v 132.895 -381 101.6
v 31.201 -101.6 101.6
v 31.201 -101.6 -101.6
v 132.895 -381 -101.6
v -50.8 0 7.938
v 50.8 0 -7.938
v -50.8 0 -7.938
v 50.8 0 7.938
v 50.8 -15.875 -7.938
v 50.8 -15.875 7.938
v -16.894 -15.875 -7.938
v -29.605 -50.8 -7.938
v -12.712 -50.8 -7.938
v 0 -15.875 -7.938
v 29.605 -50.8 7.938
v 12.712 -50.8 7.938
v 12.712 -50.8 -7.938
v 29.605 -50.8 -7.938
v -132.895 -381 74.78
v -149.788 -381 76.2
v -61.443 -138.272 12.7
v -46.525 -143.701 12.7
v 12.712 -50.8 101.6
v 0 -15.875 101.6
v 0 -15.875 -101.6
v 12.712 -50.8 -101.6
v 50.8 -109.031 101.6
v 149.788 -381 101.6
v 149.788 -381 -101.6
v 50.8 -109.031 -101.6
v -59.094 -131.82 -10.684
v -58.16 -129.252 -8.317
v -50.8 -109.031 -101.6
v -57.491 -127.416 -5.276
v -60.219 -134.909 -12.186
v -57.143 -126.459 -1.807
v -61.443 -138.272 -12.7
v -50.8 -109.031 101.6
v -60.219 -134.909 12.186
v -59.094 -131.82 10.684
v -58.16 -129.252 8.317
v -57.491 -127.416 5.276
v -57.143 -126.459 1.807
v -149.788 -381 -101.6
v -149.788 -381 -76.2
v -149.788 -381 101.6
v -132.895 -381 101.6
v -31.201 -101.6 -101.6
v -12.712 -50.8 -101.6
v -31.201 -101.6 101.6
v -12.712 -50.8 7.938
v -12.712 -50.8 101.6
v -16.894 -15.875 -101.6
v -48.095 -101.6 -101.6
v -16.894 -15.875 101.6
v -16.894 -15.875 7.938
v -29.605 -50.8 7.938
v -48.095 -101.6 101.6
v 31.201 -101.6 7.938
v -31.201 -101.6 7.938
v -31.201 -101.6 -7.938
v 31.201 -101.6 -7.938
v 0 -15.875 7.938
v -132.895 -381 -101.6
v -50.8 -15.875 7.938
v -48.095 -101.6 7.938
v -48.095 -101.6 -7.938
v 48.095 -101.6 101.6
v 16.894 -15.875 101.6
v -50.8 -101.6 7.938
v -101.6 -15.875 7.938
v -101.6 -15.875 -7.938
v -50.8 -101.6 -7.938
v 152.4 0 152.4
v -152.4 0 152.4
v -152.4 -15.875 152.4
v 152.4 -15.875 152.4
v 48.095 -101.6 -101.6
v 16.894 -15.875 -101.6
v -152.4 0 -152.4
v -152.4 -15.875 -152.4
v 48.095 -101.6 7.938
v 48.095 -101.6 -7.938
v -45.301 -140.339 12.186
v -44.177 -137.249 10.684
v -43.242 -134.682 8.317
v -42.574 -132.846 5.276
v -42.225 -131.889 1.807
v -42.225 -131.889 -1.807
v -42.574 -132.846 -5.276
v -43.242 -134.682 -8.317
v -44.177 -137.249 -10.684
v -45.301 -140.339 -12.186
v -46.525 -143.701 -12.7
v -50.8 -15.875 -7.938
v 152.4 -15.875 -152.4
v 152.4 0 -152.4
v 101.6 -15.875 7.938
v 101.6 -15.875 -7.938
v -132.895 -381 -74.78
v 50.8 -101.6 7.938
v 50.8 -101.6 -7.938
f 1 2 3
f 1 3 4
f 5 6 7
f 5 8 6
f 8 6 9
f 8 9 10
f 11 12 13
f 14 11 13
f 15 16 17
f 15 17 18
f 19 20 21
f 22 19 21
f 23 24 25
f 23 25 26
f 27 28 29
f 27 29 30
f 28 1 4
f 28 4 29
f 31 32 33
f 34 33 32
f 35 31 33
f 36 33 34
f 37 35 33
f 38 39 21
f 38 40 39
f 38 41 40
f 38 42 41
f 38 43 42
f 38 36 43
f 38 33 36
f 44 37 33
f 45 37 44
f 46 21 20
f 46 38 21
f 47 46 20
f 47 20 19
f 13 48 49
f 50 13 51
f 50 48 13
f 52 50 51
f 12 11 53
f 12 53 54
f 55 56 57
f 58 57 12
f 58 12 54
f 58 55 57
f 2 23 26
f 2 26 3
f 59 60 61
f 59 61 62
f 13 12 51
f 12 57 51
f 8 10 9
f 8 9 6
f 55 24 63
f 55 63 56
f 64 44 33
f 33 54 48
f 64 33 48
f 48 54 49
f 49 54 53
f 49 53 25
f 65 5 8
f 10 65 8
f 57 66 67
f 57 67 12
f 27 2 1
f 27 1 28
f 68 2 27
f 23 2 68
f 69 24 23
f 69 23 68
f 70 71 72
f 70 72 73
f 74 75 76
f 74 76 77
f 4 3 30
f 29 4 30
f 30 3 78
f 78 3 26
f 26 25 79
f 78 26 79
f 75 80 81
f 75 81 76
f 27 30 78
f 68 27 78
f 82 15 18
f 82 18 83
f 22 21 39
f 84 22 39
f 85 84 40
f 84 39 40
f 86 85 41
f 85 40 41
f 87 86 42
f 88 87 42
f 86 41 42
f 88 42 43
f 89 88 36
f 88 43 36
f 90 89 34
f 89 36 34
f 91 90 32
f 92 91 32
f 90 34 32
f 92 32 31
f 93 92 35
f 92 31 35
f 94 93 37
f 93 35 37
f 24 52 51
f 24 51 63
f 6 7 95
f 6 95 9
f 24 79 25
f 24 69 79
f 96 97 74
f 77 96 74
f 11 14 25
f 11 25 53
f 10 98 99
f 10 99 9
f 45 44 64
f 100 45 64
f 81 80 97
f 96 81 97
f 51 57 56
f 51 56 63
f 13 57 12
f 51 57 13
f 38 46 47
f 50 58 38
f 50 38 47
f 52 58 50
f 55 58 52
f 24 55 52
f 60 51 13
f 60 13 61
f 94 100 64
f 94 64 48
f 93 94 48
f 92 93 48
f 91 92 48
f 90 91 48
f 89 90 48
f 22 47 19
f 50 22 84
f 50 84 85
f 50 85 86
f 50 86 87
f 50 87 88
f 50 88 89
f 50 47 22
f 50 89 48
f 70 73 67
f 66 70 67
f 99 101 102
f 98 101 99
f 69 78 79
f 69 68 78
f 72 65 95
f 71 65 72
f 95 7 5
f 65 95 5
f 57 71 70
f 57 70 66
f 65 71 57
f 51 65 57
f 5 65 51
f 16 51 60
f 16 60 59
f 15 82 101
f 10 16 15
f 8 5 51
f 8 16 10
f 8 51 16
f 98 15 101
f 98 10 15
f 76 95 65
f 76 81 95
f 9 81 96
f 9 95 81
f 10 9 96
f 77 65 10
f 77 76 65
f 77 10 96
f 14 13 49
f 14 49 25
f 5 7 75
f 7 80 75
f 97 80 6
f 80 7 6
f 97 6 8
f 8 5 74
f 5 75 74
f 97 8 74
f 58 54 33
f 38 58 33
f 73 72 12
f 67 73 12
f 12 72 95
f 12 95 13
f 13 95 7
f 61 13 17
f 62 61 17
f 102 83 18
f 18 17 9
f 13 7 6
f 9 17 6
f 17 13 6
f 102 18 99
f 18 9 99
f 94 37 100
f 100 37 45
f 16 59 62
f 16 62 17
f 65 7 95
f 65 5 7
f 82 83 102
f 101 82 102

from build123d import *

# Parameters (mm, degrees)
F0_W          = 304.8
F0_H          = 304.8
F0_W_2        = 101.6
F0_H_2        = 15.875
F1_DEPTH      = 15.875
F3_DEPTH      = 7.9375
F3_DEPTH_BACK = 7.9375
F4_DEPTH      = 101.6
F4_DEPTH_BACK = 101.6
F5_DEPTH      = 7.9375
F5_DEPTH_BACK = 7.9375
F7_DEPTH      = 25.4


with BuildPart() as f1:
    # F0 (on Front) → F1 (new body)
    with BuildSketch(Plane.XZ):
        Rectangle(F0_W, F0_H)
        Rectangle(F0_W_2, F0_H_2, mode=Mode.SUBTRACT)
    extrude(amount=F1_DEPTH)


with BuildPart() as f3:
    # F2 (on Top) → F3 (new body, two sides)
    with BuildSketch(Plane.XY) as f3_sk:
        Polygon((-50.8, -50.8), (-50.8, -15.875), (-101.6, -15.875), (-50.8, -101.6), align=None)
        Polygon((50.8, 0), (-50.8, 0), (-50.8, -15.875), (-50.8, -50.8), (-29.6054825698, -50.8), (-16.8938221381, -15.875), (0, -15.875), (16.8938221381, -15.875), (29.6054825698, -50.8), (50.8, -50.8), (50.8, -15.875), align=None)
        Polygon((101.6, -15.875), (50.8, -15.875), (50.8, -50.8), (50.8, -101.6), align=None)
        Polygon((12.7116604317, -50.8), (-12.7116604317, -50.8), (-31.2013483325, -101.6), (31.2013483325, -101.6), align=None)
        Polygon((-16.8938221381, -15.875), (-29.6054825698, -50.8), (-12.7116604317, -50.8), (0, -15.875), align=None)
        Polygon((-29.6054825698, -50.8), (-50.8, -50.8), (-50.8, -101.6), (-48.0951704705, -101.6), align=None)
        Polygon((12.7116604317, -50.8), (29.6054825698, -50.8), (16.8938221381, -15.875), (0, -15.875), align=None)
        Polygon((50.8, -101.6), (50.8, -50.8), (29.6054825698, -50.8), (48.0951704705, -101.6), align=None)
        Polygon((0, -15.875), (-12.7116604317, -50.8), (12.7116604317, -50.8), align=None)
    extrude(amount=F3_DEPTH)
    extrude(f3_sk.sketch, amount=-F3_DEPTH_BACK)


with BuildPart() as f4:
    # F2 (on Top) → F4 (new body, two sides)
    with BuildSketch(Plane.XY) as f4_sk:
        Polygon((-16.8938221381, -15.875), (-29.6054825698, -50.8), (-12.7116604317, -50.8), (0, -15.875), align=None)
        Polygon((-31.2013483325, -101.6), (-48.0951704705, -101.6), (-50.8, -109.0314580557), (-149.7884539245, -381), (-132.8946317864, -381), align=None)
        Polygon((-12.7116604317, -50.8), (-29.6054825698, -50.8), (-48.0951704705, -101.6), (-31.2013483325, -101.6), align=None)
    extrude(amount=F4_DEPTH)
    extrude(f4_sk.sketch, amount=-F4_DEPTH_BACK)

    # F2 (on Top) → F5 (cut, two sides)
    with BuildSketch(Plane.XY) as f5_sk:
        Polygon((-16.8938221381, -15.875), (-29.6054825698, -50.8), (-12.7116604317, -50.8), (0, -15.875), align=None)
        Polygon((12.7116604317, -50.8), (29.6054825698, -50.8), (16.8938221381, -15.875), (0, -15.875), align=None)
    extrude(amount=F5_DEPTH, mode=Mode.SUBTRACT)
    extrude(f5_sk.sketch, amount=-F5_DEPTH_BACK, mode=Mode.SUBTRACT)

    # F6 (on face) → F7 (cut)
    with BuildSketch(Plane(origin=(-9.8154937031, 3.5725475426, 0), x_dir=(-0.3420201433, -0.9396926208, 0), z_dir=(-0.9396926208, 0.3420201433, 0))):
        with BuildLine():
            ThreePointArc((150.9473935528, 12.7), (159.9276496739, 8.9802561211), (163.6473935528, 0))
            ThreePointArc((163.6473935528, 0), (159.9276496739, -8.9802561211), (150.9473935528, -12.7))
            Line((150.9473935528, -12.7), (409.2535569992, -76.2))
            Line((409.2535569992, -76.2), (409.2535569992, 76.2))
            Line((409.2535569992, 76.2), (150.9473935528, 12.7))
        make_face()
        with BuildLine():
            ThreePointArc((150.9473935528, -12.7), (159.9276496739, -8.9802561211), (163.6473935528, 0))
            ThreePointArc((163.6473935528, 0), (159.9276496739, 8.9802561211), (150.9473935528, 12.7))
            ThreePointArc((150.9473935528, 12.7), (138.2473935528, 0), (150.9473935528, -12.7))
        make_face()
    extrude(amount=-F7_DEPTH, mode=Mode.SUBTRACT)


with BuildPart() as f4b:
    # F2 (on Top) → F4, piece 2 (new body, two sides)
    with BuildSketch(Plane.XY) as f4_2_sk:
        Polygon((12.7116604317, -50.8), (29.6054825698, -50.8), (16.8938221381, -15.875), (0, -15.875), align=None)
        Polygon((48.0951704705, -101.6), (29.6054825698, -50.8), (12.7116604317, -50.8), (31.2013483325, -101.6), align=None)
        Polygon((50.8, -109.0314580557), (48.0951704705, -101.6), (31.2013483325, -101.6), (132.8946317864, -381), (149.7884539245, -381), align=None)
    extrude(amount=F4_DEPTH)
    extrude(f4_2_sk.sketch, amount=-F4_DEPTH_BACK)


solid = Compound([f1.part, f3.part, f4.part, f4b.part])
